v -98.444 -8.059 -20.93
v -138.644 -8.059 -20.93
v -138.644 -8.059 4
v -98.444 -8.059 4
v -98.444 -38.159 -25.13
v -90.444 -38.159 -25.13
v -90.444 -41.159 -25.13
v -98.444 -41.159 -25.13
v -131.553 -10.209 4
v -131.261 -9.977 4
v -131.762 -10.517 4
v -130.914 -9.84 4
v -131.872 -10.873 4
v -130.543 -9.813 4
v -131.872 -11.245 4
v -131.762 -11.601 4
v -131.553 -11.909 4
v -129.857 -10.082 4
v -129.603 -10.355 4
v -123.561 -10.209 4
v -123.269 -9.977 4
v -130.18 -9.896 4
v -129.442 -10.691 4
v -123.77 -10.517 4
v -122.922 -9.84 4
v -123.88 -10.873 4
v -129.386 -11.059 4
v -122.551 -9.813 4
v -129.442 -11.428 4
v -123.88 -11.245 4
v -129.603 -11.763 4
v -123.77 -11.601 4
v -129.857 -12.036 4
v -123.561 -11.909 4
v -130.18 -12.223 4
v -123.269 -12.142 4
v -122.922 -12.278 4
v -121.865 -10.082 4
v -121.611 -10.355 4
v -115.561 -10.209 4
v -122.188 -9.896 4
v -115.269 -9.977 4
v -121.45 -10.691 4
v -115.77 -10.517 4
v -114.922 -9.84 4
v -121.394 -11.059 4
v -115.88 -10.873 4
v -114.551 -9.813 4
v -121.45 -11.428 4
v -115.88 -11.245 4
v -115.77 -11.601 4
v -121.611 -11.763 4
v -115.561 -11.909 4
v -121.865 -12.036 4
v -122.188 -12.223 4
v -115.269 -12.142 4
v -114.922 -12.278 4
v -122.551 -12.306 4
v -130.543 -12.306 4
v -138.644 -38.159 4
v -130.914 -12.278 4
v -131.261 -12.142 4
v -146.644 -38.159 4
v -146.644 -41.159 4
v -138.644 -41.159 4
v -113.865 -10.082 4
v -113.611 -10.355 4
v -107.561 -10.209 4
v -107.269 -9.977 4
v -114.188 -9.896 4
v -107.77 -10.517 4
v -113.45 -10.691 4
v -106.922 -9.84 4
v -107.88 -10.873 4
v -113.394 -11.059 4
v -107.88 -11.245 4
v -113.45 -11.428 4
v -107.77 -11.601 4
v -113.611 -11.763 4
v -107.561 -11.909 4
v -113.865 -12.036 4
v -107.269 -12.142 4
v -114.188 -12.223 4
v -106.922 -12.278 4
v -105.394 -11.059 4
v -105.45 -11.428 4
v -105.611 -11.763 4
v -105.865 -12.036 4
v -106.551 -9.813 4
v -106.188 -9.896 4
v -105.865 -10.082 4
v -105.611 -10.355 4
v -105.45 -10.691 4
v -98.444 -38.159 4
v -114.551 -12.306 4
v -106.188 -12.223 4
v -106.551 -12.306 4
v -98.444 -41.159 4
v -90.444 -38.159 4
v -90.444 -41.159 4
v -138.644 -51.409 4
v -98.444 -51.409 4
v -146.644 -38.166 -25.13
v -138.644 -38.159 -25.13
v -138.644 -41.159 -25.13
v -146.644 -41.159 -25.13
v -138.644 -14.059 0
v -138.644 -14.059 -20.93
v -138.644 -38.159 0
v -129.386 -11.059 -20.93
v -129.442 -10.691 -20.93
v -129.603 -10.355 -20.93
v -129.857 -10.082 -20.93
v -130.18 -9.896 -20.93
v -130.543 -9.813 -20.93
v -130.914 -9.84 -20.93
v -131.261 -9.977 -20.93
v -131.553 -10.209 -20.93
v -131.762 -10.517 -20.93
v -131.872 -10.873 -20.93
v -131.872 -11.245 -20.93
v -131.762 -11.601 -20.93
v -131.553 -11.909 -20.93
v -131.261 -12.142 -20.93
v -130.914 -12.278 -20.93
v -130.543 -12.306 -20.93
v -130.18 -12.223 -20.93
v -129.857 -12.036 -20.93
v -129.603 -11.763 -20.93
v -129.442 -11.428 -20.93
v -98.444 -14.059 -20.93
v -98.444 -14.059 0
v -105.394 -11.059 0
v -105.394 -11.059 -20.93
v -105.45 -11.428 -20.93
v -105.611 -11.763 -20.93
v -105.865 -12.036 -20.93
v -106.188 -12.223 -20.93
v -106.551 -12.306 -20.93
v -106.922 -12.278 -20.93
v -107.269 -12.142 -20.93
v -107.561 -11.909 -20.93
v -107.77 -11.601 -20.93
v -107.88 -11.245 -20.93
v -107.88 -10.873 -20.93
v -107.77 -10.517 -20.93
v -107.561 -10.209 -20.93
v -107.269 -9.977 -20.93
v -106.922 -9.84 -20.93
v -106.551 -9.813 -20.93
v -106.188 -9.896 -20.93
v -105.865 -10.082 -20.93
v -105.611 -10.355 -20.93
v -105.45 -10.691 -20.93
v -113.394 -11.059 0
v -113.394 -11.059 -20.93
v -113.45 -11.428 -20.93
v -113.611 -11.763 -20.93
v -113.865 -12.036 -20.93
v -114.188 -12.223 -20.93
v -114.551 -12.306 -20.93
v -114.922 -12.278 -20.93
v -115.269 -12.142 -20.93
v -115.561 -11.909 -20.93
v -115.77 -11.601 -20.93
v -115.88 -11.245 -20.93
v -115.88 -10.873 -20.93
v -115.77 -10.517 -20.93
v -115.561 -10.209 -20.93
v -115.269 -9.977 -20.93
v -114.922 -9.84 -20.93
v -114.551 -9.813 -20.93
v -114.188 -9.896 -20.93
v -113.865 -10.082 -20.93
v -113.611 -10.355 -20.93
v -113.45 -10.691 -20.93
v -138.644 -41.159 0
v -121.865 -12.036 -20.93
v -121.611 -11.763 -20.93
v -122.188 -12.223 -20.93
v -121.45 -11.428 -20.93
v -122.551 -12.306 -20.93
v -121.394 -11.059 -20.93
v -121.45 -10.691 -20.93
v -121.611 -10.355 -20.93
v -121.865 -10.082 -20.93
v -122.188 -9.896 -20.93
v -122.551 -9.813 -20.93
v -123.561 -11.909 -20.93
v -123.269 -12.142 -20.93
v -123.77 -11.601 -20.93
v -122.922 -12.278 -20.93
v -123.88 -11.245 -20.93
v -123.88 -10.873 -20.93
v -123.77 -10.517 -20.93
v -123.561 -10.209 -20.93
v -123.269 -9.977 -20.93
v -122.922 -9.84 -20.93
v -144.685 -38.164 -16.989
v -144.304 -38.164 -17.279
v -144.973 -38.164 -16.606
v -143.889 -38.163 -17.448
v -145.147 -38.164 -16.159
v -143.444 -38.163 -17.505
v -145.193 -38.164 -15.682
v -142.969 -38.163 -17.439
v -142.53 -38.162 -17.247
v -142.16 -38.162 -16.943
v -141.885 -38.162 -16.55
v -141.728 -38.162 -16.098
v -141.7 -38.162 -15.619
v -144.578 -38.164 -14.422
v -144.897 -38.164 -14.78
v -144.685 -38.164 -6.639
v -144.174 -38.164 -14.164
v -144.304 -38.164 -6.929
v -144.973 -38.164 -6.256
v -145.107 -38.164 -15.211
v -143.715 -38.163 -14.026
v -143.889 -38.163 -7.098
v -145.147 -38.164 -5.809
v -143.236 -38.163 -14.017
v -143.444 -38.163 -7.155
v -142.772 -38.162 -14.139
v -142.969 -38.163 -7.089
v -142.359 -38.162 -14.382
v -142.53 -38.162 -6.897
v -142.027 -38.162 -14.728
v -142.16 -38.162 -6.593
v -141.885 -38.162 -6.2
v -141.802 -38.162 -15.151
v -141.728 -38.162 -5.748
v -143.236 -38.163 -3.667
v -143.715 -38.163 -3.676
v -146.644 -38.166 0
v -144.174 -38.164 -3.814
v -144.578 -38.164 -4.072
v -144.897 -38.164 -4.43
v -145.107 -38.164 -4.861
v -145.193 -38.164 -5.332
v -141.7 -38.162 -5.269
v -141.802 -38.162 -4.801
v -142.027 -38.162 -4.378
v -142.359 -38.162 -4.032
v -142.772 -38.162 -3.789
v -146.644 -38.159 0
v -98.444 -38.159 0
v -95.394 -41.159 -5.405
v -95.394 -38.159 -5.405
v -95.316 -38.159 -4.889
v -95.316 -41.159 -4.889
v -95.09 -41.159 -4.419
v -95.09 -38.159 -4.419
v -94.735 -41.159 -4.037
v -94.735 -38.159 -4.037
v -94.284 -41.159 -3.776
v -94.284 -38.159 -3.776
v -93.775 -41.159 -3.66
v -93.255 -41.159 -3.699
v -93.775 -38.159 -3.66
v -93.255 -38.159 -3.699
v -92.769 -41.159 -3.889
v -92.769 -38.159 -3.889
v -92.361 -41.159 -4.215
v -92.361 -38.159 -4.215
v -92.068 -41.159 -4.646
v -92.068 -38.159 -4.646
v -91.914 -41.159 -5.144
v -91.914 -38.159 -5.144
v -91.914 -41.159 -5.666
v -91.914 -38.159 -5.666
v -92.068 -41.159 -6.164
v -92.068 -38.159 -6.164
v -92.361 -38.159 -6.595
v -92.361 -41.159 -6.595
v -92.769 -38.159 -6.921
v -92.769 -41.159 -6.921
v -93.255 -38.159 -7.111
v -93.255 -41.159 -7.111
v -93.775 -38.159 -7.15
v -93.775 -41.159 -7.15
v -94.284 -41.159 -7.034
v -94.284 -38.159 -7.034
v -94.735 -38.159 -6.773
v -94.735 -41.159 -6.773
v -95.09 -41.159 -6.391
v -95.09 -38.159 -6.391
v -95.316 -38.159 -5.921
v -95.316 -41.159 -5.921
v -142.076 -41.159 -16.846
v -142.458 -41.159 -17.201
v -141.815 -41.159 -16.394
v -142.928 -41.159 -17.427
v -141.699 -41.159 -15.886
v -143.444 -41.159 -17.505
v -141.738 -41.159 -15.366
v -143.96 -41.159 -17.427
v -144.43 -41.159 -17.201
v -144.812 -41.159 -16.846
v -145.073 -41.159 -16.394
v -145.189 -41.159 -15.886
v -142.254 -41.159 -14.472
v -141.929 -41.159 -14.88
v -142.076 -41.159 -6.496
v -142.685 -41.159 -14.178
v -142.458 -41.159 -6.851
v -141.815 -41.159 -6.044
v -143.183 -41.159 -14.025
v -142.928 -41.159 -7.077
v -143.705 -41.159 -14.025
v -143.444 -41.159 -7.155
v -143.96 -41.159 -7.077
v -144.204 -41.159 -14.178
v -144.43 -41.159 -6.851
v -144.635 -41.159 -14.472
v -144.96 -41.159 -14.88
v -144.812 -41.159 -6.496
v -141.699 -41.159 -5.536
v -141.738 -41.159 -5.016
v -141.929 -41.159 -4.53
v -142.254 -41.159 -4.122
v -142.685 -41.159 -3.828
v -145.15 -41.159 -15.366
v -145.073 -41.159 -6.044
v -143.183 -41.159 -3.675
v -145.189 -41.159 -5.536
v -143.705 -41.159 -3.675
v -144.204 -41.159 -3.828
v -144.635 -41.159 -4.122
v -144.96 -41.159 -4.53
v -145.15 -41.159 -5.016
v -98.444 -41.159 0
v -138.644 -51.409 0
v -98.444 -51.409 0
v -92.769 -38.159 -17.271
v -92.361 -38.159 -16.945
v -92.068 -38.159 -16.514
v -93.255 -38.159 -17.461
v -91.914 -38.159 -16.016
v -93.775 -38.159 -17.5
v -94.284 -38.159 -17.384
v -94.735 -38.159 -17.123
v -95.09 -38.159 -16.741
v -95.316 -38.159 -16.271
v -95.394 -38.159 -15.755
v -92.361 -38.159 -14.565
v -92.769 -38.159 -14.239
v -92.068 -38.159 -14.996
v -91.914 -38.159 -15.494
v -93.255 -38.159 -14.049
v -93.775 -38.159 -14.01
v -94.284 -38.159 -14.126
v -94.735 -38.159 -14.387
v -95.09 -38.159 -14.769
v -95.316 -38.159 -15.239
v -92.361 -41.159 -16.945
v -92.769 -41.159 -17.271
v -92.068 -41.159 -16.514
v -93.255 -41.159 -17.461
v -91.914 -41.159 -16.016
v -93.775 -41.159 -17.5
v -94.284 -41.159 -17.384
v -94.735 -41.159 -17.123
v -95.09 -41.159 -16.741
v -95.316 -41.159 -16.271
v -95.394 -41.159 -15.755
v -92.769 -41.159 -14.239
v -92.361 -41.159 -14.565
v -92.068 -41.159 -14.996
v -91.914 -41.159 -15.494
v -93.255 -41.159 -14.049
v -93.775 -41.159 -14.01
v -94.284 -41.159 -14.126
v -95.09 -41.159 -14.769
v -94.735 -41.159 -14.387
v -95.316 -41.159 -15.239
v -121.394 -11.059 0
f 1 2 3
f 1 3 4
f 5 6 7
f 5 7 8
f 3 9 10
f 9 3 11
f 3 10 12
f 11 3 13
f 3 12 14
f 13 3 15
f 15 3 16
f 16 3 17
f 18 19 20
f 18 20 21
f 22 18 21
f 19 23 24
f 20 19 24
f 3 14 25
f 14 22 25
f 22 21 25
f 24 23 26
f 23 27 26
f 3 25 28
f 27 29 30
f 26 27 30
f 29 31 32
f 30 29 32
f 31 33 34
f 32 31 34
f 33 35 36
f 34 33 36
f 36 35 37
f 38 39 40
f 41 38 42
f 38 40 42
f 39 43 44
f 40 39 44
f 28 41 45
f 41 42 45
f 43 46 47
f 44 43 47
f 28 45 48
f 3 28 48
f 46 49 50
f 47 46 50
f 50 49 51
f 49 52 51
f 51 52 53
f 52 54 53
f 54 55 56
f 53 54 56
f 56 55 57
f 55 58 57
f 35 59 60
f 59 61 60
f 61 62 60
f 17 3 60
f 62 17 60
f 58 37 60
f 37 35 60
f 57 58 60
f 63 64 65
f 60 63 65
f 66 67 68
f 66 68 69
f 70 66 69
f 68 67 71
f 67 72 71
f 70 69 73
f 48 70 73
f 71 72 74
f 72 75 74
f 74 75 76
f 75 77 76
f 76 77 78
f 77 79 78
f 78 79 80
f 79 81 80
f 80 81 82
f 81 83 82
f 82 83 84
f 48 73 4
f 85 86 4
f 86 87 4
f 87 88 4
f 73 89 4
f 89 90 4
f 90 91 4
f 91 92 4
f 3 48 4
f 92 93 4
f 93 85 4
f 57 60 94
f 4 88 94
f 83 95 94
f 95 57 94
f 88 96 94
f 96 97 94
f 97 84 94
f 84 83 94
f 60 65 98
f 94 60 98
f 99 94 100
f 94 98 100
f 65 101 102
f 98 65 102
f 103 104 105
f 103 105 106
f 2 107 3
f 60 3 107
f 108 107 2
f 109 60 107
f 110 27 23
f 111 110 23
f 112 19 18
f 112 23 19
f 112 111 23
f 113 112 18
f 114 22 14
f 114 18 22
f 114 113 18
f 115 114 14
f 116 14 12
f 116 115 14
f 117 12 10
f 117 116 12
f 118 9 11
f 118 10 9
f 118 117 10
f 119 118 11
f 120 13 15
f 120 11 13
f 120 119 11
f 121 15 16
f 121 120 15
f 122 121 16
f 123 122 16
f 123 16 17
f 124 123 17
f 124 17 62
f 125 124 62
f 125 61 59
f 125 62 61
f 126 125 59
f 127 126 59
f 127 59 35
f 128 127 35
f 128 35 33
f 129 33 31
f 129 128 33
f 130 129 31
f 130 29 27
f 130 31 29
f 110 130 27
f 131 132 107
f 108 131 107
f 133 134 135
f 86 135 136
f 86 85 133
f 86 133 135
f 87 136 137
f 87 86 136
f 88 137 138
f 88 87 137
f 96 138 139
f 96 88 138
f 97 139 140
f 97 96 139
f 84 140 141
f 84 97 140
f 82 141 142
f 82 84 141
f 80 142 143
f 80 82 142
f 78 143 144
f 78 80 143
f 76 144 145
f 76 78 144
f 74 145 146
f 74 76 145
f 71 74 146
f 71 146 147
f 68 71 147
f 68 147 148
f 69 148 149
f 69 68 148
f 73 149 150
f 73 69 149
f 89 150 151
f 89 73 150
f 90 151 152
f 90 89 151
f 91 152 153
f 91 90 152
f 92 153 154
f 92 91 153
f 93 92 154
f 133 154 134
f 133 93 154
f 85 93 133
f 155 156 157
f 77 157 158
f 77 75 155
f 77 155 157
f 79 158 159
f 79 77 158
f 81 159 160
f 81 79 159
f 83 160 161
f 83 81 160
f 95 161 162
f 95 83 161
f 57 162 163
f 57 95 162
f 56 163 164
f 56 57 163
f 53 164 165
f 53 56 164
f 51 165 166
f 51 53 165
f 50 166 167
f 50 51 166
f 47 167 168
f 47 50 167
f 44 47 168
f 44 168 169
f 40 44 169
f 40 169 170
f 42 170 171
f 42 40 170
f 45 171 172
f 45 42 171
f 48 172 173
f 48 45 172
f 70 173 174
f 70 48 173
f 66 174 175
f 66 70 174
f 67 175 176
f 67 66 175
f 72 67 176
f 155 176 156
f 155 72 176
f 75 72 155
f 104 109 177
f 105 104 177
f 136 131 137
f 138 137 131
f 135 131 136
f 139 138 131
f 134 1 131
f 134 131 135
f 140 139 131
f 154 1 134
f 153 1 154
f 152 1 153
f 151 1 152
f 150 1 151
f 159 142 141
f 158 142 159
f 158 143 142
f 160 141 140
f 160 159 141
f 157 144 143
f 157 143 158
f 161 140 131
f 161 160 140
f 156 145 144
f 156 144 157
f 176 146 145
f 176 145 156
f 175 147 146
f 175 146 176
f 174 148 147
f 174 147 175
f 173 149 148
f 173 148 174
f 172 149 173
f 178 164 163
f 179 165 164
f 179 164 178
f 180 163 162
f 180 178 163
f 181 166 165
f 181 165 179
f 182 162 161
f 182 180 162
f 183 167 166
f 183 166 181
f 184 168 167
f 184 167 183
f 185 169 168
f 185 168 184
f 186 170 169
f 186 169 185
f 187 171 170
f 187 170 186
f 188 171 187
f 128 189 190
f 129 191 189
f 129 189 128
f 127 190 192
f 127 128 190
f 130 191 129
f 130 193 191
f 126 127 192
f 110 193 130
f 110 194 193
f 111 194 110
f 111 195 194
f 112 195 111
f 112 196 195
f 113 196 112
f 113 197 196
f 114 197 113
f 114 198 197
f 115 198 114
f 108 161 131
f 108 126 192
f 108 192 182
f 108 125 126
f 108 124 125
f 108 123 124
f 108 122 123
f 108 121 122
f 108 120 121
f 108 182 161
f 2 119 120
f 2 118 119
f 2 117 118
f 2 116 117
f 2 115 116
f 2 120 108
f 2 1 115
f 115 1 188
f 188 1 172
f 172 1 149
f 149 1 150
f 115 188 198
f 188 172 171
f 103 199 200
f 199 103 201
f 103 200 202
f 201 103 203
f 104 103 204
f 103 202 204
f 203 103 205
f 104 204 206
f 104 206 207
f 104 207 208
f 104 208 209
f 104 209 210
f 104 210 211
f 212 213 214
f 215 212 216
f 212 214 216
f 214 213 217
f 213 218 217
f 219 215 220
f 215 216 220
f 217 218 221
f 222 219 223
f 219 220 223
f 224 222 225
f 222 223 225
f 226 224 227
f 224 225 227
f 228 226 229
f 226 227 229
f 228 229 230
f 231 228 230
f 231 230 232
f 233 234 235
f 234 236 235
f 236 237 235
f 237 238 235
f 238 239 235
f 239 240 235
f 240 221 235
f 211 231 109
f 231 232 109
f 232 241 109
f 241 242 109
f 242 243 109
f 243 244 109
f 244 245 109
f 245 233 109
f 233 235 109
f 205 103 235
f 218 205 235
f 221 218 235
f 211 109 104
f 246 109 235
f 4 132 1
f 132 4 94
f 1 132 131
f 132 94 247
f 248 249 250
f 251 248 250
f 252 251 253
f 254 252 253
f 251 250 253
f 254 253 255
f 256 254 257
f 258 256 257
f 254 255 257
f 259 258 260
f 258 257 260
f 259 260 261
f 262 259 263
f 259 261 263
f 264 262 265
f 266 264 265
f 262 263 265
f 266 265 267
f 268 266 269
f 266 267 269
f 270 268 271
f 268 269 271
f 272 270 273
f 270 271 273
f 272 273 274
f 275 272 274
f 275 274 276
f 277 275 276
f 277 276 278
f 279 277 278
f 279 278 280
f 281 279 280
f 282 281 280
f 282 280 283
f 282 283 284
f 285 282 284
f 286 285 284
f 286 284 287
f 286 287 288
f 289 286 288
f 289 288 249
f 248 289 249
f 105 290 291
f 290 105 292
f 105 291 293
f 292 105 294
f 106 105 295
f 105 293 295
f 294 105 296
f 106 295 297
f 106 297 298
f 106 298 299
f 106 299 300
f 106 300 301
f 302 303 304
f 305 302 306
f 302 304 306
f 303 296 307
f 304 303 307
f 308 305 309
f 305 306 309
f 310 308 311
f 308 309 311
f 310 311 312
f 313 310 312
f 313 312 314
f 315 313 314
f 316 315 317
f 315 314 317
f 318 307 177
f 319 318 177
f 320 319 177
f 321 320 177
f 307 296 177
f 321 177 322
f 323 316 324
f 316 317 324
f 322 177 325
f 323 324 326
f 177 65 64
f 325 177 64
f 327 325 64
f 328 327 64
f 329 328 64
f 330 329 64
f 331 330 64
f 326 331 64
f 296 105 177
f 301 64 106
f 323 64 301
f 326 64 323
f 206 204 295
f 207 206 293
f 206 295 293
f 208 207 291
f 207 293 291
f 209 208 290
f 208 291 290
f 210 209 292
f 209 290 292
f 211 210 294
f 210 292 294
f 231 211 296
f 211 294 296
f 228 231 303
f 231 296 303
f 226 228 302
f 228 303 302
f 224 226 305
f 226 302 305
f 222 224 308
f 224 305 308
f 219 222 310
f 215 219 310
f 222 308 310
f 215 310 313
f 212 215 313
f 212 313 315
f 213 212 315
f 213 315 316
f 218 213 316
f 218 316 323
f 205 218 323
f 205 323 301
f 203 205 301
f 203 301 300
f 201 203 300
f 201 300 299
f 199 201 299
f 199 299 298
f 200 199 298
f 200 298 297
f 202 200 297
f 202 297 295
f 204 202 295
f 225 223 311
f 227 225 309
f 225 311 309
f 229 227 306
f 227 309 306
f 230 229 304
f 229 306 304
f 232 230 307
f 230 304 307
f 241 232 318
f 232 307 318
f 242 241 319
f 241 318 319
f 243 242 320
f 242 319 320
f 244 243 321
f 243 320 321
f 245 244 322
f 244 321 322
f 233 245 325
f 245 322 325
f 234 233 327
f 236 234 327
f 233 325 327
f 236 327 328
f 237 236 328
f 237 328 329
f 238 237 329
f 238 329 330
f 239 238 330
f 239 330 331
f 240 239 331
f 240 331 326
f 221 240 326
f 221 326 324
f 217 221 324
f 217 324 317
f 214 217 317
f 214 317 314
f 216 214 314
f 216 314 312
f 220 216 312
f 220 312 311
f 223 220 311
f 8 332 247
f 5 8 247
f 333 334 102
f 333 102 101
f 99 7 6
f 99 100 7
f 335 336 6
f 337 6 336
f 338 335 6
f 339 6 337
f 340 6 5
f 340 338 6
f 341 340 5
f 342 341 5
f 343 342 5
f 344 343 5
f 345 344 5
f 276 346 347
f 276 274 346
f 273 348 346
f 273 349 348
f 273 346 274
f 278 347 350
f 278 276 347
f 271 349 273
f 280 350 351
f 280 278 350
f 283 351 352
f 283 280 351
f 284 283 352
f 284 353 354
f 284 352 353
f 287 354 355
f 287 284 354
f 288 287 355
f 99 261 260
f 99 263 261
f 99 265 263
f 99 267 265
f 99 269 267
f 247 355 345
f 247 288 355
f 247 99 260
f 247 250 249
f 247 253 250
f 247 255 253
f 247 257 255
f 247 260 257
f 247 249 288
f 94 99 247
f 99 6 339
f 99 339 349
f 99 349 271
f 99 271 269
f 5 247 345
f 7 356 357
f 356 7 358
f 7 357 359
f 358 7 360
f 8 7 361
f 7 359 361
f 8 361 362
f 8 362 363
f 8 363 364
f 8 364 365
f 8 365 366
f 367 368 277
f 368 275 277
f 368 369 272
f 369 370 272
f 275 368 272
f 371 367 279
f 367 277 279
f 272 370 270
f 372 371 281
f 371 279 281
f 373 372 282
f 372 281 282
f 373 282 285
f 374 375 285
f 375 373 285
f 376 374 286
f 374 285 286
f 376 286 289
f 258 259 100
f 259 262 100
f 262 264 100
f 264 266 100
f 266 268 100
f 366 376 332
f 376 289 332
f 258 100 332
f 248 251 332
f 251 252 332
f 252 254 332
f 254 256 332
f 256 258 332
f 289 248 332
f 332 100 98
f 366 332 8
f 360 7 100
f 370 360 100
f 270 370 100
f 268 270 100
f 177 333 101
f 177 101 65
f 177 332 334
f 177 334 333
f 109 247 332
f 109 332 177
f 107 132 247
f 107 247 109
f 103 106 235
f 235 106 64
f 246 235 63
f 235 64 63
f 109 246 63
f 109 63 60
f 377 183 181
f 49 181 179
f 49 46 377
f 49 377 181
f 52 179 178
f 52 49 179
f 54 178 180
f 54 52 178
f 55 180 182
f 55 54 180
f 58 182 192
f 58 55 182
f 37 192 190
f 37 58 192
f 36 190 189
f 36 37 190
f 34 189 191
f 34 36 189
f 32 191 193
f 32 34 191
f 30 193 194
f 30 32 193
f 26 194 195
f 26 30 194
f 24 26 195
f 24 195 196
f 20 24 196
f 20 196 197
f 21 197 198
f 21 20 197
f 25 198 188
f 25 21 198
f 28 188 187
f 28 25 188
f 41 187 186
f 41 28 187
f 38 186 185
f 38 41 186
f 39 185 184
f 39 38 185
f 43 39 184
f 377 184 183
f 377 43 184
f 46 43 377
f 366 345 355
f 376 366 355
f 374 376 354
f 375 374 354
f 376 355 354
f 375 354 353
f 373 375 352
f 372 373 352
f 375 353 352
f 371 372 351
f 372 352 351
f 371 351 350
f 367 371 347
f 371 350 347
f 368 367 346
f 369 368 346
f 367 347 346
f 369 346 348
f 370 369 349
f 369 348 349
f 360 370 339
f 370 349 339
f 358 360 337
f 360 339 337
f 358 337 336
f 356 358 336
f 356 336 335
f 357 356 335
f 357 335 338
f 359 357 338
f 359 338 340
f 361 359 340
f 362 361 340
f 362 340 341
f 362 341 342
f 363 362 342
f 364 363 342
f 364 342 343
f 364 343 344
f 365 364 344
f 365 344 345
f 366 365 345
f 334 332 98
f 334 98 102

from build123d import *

# Parameters (mm, degrees)
BOSS_EXTRUDE2_DEPTH      = 4
BOSS_EXTRUDE3_DEPTH      = 25.13
SKETCH7_W                = 8
SKETCH7_H                = 3
BOSS_EXTRUDE4_DEPTH      = 25.13
SKETCH32_W               = 40.2
SKETCH32_H               = 6
BOSS_EXTRUDE6_DEPTH      = 20.93
SKETCH70_R               = 1.75
CUT_EXTRUDE23_DEPTH      = 5
SKETCH71_R               = 1.75
CUT_EXTRUDE24_DEPTH      = 6
CUT_EXTRUDE26_DEPTH      = 10
CUT_EXTRUDE26_DEPTH_BACK = 25
SKETCH86_R               = 1.25
SKETCH88_W               = 40.2
SKETCH88_H               = 4
BOSS_EXTRUDE26_DEPTH     = 6
CUT_EXTRUDE28_DEPTH      = 4
CUT_EXTRUDE28_DEPTH_BACK = 30
SKETCH89_R               = 1.25


with BuildPart() as part:
    # Sketch5 → Boss-Extrude2 (new body)
    with BuildSketch(Plane.XY):
        Polygon((-138.644230049, -41.159116495), (-138.644230049, -51.409116495), (-98.444230049, -51.409116495), (-98.444230049, -41.159116495), (-90.444230049, -41.159116495), (-90.444230049, -38.159116495), (-98.444230049, -38.159116495), (-98.444230049, -14.059116495), (-138.644230049, -14.059116495), (-138.644230049, -38.159116495), (-146.644230049, -38.159116495), (-146.644230049, -41.159116495), align=None)
    extrude(amount=BOSS_EXTRUDE2_DEPTH)

    # Sketch6 → Boss-Extrude3 (add)
    with BuildSketch(Plane(origin=(0, 0, 0), x_dir=(-1, 0, 0), z_dir=(0, 0, -1))):
        Polygon((146.644230049, -38.165572531), (138.644230049, -38.159116495), (138.644230049, -41.159116495), (146.644230049, -41.159116495), align=None)
    extrude(amount=BOSS_EXTRUDE3_DEPTH)

    # Sketch7 → Boss-Extrude4 (add)
    with BuildSketch(Plane(origin=(0, 0, 0), x_dir=(-1, 0, 0), z_dir=(0, 0, -1))):
        with Locations((94.444230049, -39.659116495)):
            Rectangle(SKETCH7_W, SKETCH7_H)
    extrude(amount=BOSS_EXTRUDE4_DEPTH)

    # Sketch70 → Cut-Extrude23 (cut)
    with BuildSketch(Plane(origin=(0, -38.159116495, 0), x_dir=(1, 0, 0), z_dir=(0, 1, 0))):
        with Locations((-93.644230062, 15.755)):
            Circle(SKETCH70_R)
        with Locations((-93.644230062, 5.405)):
            Circle(SKETCH70_R)
    extrude(amount=-CUT_EXTRUDE23_DEPTH, mode=Mode.SUBTRACT)

    # Sketch71 → Cut-Extrude24 (cut)
    with BuildSketch(Plane(origin=(0, -41.159116495, 0), x_dir=(-1, 0, 0), z_dir=(0, -1, 0))):
        with Locations((143.444230049, 15.755)):
            Circle(SKETCH71_R)
        with Locations((143.444230049, 5.405)):
            Circle(SKETCH71_R)
    extrude(amount=-CUT_EXTRUDE24_DEPTH, mode=Mode.SUBTRACT)



with BuildPart() as body_2:
    # Sketch32 → Boss-Extrude6 (new body)
    with BuildSketch(Plane(origin=(0, 0, 0), x_dir=(-1, 0, 0), z_dir=(0, 0, -1))):
        with Locations((118.544230049, -11.059116495)):
            Rectangle(SKETCH32_W, SKETCH32_H)
    extrude(amount=BOSS_EXTRUDE6_DEPTH)

    # Sketch86 → Cut-Extrude26 (cut, two sides: drawn at the far end of the back side and taken through both)
    with BuildSketch(Plane(origin=(0, 0, -20.93), x_dir=(-1, 0, 0), z_dir=(0, 0, -1)).offset(-CUT_EXTRUDE26_DEPTH_BACK)):
        with Locations((122.644230049, -11.0591165)):
            Circle(SKETCH86_R)
        with Locations((114.644230049, -11.0591165)):
            Circle(SKETCH86_R)
        with Locations((106.644230049, -11.0591165)):
            Circle(SKETCH86_R)
    extrude(amount=CUT_EXTRUDE26_DEPTH + CUT_EXTRUDE26_DEPTH_BACK, mode=Mode.SUBTRACT)


with BuildPart() as part_1:
    add(part.part)

    add(body_2.part)  # Boss-Extrude26 merges body 2
    # Sketch88 → Boss-Extrude26 (add)
    with BuildSketch(Plane(origin=(0, -14.059116495, 0), x_dir=(1, 0, 0), z_dir=(0, 1, 0))):
        with Locations((-118.544230049, -2)):
            Rectangle(SKETCH88_W, SKETCH88_H)
    extrude(amount=BOSS_EXTRUDE26_DEPTH)

    # Sketch89 → Cut-Extrude28 (cut, two sides: drawn at the far end of the back side and taken through both)
    with BuildSketch(Plane.XY.offset(4).offset(-CUT_EXTRUDE28_DEPTH_BACK)):
        with Locations((-130.636250743, -11.059116495)):
            Circle(SKETCH89_R)
        with Locations((-122.644230049, -11.059116495)):
            Circle(SKETCH89_R)
        with Locations((-114.644230049, -11.059116495)):
            Circle(SKETCH89_R)
        with Locations((-106.644230049, -11.059116495)):
            Circle(SKETCH89_R)
    extrude(amount=CUT_EXTRUDE28_DEPTH + CUT_EXTRUDE28_DEPTH_BACK, mode=Mode.SUBTRACT)


solid = part_1.part
